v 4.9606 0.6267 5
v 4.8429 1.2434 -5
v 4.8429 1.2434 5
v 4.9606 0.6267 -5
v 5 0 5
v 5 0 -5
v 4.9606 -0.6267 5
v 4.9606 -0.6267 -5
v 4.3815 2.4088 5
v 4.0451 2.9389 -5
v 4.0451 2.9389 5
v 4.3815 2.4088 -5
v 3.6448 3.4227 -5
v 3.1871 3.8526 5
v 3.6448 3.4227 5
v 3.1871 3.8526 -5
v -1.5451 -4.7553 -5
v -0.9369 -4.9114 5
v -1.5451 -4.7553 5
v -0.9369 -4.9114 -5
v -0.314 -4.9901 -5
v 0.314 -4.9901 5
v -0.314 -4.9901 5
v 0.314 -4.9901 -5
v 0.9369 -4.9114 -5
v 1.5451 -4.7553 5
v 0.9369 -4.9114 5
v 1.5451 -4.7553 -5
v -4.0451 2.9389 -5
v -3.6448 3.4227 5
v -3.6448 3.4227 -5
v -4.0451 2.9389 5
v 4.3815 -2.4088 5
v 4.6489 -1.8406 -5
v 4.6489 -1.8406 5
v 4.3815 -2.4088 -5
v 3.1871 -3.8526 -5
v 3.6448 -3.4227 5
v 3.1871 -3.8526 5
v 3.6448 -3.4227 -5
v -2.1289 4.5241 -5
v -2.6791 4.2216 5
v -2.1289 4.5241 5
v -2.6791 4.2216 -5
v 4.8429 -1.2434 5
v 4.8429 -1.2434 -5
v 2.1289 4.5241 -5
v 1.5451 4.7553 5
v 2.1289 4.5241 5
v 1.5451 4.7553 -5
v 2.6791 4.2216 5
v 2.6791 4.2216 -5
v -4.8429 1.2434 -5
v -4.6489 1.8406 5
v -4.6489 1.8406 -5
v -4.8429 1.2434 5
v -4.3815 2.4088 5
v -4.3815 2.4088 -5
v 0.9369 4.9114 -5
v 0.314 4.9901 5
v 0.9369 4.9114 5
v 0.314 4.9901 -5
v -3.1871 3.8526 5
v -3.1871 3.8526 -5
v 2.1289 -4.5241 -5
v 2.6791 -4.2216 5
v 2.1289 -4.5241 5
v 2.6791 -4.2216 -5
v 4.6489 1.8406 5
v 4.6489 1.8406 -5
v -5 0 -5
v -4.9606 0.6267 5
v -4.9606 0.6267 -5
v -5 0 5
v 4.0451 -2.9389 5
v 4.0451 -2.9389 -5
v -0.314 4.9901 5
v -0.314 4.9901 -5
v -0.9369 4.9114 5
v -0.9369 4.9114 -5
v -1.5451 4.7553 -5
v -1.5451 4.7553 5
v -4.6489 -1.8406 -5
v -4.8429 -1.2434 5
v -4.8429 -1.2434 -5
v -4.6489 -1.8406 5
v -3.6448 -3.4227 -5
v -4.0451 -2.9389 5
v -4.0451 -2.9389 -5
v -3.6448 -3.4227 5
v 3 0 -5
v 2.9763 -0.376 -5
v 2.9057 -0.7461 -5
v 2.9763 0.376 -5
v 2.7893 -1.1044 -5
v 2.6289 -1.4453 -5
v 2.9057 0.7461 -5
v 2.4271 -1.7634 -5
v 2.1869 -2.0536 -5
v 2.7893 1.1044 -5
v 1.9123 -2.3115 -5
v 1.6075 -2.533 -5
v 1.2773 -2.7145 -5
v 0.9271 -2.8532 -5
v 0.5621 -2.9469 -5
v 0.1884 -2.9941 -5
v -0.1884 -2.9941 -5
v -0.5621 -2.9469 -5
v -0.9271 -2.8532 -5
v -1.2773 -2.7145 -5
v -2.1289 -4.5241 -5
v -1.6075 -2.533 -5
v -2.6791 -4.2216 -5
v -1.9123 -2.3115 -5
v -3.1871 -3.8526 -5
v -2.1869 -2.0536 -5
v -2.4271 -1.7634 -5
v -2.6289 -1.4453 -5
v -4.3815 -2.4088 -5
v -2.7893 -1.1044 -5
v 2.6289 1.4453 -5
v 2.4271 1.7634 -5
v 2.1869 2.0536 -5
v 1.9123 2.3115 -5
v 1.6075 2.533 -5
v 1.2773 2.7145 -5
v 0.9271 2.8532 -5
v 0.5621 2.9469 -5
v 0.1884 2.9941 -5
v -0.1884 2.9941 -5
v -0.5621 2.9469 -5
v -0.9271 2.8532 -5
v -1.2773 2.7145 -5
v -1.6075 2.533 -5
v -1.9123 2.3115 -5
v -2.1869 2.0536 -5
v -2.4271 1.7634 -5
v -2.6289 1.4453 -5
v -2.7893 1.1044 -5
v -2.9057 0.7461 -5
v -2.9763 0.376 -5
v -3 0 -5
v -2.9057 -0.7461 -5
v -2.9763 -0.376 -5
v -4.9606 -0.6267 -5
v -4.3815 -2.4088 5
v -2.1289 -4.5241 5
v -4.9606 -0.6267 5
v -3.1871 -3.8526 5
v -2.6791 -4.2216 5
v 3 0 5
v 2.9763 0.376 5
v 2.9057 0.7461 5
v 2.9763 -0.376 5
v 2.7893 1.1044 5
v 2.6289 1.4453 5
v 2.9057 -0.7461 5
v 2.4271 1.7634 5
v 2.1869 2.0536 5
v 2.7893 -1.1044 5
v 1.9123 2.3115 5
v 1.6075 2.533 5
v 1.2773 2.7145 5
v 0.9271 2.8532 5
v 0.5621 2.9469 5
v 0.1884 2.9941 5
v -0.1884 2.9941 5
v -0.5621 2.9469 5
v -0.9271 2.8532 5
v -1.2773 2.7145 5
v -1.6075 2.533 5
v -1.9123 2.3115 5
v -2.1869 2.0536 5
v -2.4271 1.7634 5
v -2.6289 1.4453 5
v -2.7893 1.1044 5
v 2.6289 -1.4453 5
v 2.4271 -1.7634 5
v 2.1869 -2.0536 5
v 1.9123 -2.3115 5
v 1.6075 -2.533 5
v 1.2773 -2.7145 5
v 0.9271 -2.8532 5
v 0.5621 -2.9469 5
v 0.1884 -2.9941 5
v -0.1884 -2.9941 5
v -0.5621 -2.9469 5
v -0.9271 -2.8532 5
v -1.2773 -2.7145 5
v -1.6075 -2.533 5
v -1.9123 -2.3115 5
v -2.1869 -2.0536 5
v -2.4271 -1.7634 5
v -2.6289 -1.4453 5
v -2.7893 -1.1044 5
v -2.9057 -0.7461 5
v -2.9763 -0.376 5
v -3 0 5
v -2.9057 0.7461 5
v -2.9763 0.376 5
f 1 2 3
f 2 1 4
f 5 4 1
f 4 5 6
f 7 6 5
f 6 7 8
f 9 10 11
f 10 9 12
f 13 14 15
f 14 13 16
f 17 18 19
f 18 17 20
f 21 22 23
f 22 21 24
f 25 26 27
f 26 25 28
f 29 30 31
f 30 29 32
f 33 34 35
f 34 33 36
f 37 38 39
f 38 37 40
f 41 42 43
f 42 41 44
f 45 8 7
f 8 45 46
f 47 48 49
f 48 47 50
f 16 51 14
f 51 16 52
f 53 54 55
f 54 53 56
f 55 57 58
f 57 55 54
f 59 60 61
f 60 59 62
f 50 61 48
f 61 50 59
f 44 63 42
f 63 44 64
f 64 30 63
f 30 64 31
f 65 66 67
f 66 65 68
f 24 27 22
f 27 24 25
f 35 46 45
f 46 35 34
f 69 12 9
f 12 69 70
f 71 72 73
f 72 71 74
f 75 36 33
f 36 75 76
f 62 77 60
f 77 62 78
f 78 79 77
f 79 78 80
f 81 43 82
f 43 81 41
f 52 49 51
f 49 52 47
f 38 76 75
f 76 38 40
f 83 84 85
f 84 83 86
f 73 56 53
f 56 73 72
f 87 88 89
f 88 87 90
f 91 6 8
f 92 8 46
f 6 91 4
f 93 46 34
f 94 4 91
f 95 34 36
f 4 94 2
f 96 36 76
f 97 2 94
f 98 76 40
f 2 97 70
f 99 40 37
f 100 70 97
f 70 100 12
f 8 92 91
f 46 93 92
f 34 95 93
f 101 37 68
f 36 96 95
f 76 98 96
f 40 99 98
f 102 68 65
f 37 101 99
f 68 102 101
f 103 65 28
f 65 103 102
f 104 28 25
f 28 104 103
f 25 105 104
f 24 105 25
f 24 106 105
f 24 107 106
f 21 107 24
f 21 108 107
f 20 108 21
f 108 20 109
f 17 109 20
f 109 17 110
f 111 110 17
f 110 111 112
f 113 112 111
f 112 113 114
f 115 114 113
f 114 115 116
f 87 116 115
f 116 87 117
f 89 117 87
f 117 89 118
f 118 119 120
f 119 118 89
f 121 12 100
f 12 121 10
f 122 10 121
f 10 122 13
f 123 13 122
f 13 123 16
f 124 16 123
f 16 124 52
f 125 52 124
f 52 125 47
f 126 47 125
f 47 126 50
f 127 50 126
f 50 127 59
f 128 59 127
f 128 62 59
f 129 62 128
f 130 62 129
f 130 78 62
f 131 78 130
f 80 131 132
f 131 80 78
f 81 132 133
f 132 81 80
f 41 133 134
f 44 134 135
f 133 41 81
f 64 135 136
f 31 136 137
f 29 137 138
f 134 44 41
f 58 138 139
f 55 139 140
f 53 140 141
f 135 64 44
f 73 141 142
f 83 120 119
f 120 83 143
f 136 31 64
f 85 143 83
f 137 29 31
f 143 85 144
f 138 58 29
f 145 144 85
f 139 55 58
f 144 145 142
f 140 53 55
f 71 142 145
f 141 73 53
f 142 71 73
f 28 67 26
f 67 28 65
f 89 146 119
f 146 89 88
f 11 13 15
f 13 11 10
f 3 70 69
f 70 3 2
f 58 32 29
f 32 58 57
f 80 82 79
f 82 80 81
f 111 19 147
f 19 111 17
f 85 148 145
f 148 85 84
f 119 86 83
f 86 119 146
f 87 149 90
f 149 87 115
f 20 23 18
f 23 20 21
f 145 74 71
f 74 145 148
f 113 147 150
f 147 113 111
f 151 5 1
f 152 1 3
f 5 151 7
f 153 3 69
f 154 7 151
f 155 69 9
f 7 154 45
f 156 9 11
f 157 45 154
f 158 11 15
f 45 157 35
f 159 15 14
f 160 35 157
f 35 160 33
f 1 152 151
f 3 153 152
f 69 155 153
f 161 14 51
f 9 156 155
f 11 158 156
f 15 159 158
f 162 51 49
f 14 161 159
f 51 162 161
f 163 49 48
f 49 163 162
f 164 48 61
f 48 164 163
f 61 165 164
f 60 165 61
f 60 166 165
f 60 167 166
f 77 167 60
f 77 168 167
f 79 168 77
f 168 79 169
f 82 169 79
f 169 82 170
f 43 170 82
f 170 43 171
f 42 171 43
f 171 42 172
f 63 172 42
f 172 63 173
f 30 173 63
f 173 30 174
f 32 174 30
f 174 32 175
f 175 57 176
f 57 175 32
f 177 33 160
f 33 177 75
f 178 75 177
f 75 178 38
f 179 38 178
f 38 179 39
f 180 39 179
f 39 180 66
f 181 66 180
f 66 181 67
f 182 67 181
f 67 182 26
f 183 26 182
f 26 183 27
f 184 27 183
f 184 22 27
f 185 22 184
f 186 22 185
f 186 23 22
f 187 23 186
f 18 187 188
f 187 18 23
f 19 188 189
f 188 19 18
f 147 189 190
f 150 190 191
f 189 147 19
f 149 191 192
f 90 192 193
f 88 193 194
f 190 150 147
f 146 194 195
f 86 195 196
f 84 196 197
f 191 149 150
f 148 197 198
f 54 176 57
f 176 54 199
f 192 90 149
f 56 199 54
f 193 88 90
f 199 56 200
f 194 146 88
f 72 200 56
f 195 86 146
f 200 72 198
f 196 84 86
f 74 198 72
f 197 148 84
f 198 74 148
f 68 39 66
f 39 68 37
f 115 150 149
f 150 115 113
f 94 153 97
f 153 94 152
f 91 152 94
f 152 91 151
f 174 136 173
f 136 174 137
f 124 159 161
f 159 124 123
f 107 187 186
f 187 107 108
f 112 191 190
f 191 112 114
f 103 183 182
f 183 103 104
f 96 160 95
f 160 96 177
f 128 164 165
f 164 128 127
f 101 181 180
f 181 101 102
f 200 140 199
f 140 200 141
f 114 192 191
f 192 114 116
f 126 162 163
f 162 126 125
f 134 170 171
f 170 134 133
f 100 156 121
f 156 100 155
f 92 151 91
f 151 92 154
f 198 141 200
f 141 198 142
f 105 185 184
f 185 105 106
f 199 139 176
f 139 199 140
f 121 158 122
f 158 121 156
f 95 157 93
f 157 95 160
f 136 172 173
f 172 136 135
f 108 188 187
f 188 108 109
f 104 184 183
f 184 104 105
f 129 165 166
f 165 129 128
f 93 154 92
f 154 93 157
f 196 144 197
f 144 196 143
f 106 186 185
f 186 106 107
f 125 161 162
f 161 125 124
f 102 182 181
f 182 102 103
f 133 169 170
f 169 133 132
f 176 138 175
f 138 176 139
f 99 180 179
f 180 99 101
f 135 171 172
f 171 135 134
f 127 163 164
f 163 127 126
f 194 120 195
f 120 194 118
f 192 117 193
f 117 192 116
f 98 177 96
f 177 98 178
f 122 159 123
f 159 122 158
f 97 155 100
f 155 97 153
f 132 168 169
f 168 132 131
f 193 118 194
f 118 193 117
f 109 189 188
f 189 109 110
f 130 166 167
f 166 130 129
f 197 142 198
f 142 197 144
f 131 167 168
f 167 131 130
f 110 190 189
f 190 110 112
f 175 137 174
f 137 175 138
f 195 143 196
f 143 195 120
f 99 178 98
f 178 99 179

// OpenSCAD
$fn = 50;


difference() {
	union() {
		translate(v = [0, 0, -5.0000000000]) {
			cylinder(h = 10, r = 5.0000000000);
		}
	}
	union() {
		translate(v = [0, 0, -100.0000000000]) {
			cylinder(h = 200, r = 3.0000000000);
		}
	}
}
